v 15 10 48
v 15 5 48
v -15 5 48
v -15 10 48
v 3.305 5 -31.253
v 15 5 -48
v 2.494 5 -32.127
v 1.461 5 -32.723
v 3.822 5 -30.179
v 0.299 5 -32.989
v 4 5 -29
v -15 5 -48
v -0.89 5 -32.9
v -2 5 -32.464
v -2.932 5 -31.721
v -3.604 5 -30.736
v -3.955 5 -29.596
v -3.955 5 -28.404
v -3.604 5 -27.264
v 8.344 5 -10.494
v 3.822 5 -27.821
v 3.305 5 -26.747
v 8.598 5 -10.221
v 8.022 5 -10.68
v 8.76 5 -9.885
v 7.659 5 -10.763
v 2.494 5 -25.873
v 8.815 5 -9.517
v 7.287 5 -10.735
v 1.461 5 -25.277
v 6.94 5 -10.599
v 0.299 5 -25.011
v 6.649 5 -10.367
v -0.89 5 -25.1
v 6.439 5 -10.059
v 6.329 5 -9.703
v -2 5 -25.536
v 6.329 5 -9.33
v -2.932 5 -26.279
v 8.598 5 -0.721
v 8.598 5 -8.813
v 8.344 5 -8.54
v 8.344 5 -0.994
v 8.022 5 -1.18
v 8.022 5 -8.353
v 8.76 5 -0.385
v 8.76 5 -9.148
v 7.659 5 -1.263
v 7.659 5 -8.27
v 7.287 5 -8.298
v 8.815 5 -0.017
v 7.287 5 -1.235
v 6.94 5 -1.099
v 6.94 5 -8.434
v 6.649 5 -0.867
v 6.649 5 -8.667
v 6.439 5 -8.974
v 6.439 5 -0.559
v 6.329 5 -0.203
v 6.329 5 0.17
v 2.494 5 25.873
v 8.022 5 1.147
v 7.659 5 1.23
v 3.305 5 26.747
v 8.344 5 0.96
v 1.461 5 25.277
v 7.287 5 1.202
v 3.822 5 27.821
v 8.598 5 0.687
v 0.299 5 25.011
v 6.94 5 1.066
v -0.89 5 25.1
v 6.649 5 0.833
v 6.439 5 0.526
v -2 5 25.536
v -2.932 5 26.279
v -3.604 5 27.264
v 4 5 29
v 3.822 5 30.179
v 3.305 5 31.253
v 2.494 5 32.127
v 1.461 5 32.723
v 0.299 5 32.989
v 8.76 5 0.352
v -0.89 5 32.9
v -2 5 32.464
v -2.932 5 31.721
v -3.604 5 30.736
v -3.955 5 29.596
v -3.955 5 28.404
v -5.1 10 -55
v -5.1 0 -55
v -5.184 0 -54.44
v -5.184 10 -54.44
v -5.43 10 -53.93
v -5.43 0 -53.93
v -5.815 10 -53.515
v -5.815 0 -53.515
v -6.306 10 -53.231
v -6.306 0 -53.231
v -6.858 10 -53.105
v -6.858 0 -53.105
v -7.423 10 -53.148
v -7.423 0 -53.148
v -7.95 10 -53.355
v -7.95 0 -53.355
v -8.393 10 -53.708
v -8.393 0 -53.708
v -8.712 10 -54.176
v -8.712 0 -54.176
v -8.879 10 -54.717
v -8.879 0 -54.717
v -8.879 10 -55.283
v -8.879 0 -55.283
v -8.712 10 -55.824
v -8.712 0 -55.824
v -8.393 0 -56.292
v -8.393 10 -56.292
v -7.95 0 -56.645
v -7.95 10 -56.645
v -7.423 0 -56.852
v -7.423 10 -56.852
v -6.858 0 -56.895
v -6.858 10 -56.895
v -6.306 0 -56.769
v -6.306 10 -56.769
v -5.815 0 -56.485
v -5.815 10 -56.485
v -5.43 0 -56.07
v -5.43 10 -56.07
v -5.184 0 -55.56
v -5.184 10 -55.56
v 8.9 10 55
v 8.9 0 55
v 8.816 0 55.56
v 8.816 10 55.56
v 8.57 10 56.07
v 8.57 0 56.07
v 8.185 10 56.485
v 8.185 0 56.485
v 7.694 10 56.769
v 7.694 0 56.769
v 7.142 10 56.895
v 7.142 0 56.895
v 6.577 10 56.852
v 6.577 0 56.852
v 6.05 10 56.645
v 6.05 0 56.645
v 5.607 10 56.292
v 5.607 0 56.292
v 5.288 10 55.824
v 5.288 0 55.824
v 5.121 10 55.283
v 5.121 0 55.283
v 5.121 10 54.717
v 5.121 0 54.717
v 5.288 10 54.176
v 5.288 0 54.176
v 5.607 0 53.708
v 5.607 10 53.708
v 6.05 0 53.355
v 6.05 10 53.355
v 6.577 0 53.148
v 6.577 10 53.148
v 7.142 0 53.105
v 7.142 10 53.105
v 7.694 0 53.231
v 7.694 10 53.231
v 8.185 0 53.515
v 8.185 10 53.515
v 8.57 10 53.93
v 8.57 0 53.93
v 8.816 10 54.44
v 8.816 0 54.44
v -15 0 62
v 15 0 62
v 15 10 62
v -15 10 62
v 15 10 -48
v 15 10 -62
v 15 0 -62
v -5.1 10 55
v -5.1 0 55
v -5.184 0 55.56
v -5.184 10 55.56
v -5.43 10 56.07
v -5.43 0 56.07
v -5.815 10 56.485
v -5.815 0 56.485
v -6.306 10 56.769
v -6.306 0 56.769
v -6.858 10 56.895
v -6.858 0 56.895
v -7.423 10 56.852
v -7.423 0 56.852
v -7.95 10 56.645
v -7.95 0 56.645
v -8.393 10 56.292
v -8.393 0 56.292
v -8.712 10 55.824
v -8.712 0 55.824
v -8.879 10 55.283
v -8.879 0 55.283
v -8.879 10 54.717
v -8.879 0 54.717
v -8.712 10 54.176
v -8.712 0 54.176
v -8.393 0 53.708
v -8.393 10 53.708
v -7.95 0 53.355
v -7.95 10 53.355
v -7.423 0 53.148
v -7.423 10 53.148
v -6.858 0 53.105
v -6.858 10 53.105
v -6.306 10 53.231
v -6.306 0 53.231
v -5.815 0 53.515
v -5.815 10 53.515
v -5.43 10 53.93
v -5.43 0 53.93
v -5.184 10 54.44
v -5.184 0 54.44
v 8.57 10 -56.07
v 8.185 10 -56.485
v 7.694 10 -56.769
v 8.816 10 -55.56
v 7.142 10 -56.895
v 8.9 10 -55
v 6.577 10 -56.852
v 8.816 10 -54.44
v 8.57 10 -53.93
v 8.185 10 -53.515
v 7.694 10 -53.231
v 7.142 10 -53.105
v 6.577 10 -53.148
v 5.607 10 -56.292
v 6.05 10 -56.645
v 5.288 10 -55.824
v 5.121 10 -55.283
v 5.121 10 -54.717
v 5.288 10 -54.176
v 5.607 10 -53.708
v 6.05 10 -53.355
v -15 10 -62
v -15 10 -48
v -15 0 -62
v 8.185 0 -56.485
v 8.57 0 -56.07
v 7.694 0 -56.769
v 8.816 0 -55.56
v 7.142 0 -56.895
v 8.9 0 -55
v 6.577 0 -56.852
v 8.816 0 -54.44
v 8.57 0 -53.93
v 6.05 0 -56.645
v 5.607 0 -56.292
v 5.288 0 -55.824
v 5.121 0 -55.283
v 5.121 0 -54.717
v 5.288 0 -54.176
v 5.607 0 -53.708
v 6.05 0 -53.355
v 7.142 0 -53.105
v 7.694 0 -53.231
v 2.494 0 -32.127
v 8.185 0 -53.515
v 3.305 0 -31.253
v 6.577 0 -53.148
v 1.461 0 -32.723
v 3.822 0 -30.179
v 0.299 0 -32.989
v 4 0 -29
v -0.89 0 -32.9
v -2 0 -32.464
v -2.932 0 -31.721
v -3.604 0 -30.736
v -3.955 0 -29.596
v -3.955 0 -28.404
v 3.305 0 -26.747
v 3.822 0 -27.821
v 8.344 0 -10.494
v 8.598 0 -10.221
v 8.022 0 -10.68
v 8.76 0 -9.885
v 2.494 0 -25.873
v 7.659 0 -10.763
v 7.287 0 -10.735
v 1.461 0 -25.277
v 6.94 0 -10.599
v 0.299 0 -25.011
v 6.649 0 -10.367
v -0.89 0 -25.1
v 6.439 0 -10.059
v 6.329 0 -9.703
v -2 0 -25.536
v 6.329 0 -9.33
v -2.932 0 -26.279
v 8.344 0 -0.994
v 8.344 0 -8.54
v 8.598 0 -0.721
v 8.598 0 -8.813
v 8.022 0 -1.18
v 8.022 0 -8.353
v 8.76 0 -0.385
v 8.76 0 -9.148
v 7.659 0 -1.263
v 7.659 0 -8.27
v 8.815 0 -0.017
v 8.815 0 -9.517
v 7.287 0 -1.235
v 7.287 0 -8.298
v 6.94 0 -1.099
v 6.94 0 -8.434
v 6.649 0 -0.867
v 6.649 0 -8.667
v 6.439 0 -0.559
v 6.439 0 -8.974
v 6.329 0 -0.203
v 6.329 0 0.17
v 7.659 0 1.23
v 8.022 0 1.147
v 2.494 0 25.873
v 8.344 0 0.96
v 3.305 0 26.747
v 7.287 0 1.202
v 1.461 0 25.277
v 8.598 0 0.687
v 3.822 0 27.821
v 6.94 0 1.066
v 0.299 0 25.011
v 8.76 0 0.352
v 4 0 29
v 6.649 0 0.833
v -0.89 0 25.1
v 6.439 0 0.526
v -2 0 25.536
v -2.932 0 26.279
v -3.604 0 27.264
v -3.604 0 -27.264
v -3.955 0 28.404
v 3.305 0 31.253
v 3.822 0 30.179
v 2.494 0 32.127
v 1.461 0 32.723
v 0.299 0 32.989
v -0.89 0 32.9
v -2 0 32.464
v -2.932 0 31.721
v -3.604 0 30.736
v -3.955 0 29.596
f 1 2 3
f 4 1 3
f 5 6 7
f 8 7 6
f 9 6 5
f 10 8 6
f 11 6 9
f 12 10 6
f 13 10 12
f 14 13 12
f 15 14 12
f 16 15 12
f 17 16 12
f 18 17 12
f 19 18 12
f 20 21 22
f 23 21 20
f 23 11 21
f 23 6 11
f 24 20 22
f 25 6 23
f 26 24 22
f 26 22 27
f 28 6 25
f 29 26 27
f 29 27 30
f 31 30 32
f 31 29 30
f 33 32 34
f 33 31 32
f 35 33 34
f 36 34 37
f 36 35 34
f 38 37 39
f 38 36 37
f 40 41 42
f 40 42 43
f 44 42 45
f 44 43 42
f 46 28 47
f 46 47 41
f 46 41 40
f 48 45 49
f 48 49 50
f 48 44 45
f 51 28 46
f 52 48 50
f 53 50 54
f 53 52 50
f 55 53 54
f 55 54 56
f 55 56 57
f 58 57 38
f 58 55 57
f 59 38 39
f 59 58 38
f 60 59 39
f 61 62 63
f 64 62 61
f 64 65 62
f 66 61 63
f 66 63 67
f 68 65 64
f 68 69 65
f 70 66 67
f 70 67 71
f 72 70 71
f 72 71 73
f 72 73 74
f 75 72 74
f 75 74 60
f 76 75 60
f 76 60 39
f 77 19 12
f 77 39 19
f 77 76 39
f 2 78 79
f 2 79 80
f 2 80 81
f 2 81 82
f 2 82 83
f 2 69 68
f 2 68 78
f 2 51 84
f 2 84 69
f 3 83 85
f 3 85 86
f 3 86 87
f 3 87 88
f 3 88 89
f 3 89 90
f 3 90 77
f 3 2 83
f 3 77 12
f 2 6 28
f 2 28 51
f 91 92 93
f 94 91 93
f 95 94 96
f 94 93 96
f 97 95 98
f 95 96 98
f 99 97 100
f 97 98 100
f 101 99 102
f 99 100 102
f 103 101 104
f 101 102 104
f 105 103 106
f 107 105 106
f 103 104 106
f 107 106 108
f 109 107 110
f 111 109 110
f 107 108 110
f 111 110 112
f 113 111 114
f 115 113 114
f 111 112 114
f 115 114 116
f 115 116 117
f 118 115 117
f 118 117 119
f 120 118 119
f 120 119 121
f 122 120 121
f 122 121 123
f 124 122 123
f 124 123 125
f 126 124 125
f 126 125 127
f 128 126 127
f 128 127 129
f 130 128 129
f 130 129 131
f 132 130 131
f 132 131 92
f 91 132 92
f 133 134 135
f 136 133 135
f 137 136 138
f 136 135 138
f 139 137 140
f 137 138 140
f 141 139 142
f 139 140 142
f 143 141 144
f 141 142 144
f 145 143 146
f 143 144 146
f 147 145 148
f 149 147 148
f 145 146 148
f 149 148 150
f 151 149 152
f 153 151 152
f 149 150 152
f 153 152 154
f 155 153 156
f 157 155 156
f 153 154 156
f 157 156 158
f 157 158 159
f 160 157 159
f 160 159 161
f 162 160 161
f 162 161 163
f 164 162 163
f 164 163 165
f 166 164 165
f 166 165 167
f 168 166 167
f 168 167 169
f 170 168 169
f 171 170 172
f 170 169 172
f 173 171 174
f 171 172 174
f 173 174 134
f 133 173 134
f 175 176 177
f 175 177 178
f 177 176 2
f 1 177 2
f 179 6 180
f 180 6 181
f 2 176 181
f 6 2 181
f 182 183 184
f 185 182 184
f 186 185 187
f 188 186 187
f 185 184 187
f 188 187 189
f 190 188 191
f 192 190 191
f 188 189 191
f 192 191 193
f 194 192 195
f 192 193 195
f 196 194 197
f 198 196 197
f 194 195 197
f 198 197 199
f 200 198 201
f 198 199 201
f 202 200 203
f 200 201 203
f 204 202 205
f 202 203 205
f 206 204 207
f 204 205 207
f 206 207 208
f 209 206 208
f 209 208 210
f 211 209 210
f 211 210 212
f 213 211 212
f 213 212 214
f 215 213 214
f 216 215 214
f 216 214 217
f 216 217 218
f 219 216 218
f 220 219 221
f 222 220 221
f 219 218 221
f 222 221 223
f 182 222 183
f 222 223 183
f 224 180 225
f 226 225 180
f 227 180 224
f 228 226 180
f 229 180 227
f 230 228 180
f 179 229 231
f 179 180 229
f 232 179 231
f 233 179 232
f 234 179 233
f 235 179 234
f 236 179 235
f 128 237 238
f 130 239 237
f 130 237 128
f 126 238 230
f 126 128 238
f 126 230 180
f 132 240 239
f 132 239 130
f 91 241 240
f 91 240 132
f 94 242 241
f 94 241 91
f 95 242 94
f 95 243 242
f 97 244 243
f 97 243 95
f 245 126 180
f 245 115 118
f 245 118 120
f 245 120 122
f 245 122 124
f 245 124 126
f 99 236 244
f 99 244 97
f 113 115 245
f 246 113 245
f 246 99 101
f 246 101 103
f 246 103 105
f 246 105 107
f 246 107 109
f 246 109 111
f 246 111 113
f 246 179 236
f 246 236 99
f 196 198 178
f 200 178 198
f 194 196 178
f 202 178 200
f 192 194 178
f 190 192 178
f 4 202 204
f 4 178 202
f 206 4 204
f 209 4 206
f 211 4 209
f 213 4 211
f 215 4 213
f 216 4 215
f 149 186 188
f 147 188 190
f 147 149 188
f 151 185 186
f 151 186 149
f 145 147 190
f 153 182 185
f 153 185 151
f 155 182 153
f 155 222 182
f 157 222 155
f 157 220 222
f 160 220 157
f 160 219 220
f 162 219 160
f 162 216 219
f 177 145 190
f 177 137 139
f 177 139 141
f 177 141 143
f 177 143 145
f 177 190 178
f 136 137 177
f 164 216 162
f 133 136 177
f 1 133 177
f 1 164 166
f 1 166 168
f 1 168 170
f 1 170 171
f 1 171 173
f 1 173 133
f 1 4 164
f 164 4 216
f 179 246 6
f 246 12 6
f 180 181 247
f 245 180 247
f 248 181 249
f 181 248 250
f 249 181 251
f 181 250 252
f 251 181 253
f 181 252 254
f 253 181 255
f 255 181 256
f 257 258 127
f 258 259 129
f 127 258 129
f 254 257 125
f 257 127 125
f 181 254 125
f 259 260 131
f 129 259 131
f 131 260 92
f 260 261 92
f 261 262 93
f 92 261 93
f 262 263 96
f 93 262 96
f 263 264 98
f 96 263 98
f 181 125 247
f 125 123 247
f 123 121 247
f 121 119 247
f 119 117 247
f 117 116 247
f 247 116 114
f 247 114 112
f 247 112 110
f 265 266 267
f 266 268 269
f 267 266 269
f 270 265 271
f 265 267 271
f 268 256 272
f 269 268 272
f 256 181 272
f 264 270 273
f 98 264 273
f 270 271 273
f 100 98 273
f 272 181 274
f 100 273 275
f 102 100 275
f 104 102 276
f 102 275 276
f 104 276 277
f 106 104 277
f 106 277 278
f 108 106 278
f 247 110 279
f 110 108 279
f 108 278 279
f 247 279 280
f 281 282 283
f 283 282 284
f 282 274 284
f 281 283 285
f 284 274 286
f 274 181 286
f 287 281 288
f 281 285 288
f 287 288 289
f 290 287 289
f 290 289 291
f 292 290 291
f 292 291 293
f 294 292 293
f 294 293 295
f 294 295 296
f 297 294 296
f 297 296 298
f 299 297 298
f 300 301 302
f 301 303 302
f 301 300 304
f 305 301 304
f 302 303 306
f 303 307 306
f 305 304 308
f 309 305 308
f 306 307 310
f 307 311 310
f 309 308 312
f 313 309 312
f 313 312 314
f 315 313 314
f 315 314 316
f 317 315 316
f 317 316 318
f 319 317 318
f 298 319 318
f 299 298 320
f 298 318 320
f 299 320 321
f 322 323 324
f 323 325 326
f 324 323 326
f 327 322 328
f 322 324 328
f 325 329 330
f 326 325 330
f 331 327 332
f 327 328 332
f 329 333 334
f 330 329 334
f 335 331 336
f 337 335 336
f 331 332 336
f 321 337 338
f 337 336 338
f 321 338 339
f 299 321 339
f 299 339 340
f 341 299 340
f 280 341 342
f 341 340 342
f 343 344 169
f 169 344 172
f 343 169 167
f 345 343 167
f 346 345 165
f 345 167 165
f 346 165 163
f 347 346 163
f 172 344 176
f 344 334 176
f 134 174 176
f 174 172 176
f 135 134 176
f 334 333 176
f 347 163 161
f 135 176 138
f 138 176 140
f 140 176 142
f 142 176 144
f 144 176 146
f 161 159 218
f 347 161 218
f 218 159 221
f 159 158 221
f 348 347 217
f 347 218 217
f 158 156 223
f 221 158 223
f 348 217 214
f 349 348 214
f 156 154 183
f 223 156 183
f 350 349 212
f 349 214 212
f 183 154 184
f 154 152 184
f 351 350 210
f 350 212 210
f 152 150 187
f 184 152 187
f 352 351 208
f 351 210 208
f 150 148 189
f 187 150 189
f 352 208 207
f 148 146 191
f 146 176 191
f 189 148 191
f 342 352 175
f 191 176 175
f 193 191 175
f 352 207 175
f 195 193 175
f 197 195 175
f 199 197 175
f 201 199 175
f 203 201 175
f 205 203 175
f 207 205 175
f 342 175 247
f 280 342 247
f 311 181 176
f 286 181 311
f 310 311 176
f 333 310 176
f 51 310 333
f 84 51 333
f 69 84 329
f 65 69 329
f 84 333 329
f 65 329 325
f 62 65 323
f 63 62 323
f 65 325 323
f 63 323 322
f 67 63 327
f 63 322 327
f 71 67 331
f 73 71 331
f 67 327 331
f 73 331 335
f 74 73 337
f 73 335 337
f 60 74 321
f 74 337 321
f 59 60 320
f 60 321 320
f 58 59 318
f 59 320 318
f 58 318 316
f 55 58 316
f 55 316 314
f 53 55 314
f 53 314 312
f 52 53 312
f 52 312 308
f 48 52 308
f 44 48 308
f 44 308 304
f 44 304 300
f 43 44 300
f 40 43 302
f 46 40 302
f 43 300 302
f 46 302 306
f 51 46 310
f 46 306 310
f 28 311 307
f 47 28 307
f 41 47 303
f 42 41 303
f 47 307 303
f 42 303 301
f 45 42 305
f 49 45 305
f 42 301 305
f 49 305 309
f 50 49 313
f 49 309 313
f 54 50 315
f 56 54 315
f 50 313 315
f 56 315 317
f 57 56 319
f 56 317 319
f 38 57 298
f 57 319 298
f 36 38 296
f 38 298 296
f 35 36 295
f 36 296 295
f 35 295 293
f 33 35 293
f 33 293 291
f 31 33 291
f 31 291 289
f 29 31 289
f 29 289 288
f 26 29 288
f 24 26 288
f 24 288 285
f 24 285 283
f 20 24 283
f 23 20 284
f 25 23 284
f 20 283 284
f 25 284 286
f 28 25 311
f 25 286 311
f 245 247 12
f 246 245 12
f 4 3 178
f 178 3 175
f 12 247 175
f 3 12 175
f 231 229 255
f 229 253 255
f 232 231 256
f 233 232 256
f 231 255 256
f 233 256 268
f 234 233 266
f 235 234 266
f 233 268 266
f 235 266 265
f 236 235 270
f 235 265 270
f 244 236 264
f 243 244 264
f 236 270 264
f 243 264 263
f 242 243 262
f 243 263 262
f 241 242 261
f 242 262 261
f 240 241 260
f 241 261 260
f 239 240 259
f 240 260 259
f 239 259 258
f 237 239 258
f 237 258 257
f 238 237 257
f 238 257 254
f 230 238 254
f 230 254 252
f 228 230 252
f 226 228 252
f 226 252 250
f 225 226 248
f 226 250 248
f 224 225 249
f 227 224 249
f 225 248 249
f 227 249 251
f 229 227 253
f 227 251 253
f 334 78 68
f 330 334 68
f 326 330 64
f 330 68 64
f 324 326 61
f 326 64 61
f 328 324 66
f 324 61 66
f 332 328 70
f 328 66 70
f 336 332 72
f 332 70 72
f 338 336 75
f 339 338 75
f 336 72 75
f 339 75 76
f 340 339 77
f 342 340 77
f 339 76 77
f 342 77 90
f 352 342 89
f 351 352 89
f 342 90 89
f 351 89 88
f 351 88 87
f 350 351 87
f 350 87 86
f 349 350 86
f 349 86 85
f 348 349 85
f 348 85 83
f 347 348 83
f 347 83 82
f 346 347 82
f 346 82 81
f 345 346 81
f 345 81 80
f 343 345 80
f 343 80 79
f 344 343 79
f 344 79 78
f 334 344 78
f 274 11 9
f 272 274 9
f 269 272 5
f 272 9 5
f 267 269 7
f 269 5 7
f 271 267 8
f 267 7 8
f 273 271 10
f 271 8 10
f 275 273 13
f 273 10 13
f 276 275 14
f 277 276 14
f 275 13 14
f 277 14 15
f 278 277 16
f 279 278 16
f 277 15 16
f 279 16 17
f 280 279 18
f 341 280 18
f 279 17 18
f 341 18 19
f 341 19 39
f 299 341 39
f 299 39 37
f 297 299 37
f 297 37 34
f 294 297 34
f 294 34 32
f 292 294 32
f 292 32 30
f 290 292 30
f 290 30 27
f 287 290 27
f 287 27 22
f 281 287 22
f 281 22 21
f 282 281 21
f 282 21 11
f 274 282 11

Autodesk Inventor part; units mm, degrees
ref_plane "YZ Plane" through (0, 0, 0) normal (1, 0, 0) x (0, 1, 0)
ref_plane "XZ Plane" through (0, 0, 0) normal (0, 1, 0) x (-1, 0, 0)
ref_plane "XY Plane" through (0, 0, 0) normal (0, 0, 1) x (1, 0, 0)
sketch "Эскиз1" plane through (0, 0, 0) normal (0, 1, 0) x (-1, 0, 0)
  line L0 (-15, 62) -> (15, 62)
  line L1 (15, 62) -> (15, -62)
  line L2 (15, -62) -> (-15, -62)
  line L3 (-15, -62) -> (-15, 62)
  line L4 (-15, 62) -> (15, -62) construction
  line L5 (15, 62) -> (-15, -62) construction
  point P0 (0, 0)
  dimension "d0" = 30
  dimension "d1" = 124
extrude "Выдавливание1" add sketch "Эскиз1" along normal blind 5
sketch "Эскиз2" plane through (0, 5, 0) normal (0, 1, 0) x (1, 0, 0)
  line L0 (-15, -62) -> (15, -62) projected
  line L1 (15, -62) -> (15, 62) projected
  line L2 (-15, -62) -> (15, -62)
  line L3 (15, -62) -> (15, -48)
  line L4 (15, -48) -> (-15, -48)
  line L5 (-15, -48) -> (-15, -62)
  point P0 (0, 0)
  dimension "d4" = 14
extrude "Выдавливание2" add sketch "Эскиз2" along normal blind 5
mirror "Зеркальное отражение1" about plane through (0, 0, 0) normal (0, 0, 1) of "Выдавливание2"
sketch "Эскиз3" plane through (0, 5, 0) normal (0, 1, 0) x (1, 0, 0)
  line L0 (15, 48) -> (-15, 48) projected
  line L1 (0, 48) -> (0, 29)
  circle A0 centre (0, 29) radius 4
  point P0 (0, 0)
  dimension "d7" = 19
  dimension "d8" = 8
extrude "Выдавливание3" cut sketch "Эскиз3" against normal blind 15
mirror "Зеркальное отражение2" about plane through (0, 0, 0) normal (0, 0, 1) of "Выдавливание3"
sketch "Эскиз4" plane through (0, 0, 0) normal (0, -1, 0) x (1, 0, 0)
  line L0 (15, -62) -> (15, 62) projected
  line L1 (15, 48) -> (-15, 48) projected
  line L2 (15, 62) -> (-15, 62)
  line L3 (-15, 62) -> (-15, 48)
  line L4 (-15, 48) -> (15, 48)
  line L5 (15, 48) -> (15, 62)
  line L6 (15, 62) -> (-15, 62) projected
  line L7 (0, 62) -> (0, 55)
  line L8 (0, 55) -> (7, 55)
  circle A0 centre (7, 55) radius 1.9
  circle A1 centre (-7, 55) radius 1.9
  point P0 (0, 0)
  dimension "d11" = 7
  dimension "d12" = 7
  dimension "d13" = 3.8
extrude "Выдавливание4" cut sketch "Эскиз4" against normal through all contours A0 | A1
mirror "Зеркальное отражение3" about plane through (0, 0, 0) normal (0, 0, 1) of "Выдавливание4"
sketch "Эскиз5" plane through (0, 0, 0) normal (0, -1, 0) x (1, 0, 0)
  line L0 (15.3651, -14.5668) -> (15.3651, -14.0542)
  line L1 (15.3651, -14.0542) -> (13.9311, -13.9625)
  arc A0 (13.9311, -9.7711) -> (13.9311, -13.9625) centre (14.0651, -11.8668) ccw
  line L2 (13.9311, -9.7711) -> (15.3651, -9.6794)
  line L3 (15.3651, -9.6794) -> (15.3651, -5.3911)
  arc A1 (15.3651, -5.3911) -> (15.3358, -5.3204) centre (15.2651, -5.3911) ccw
  line L4 (15.3358, -5.3204) -> (15.0115, -4.9961)
  arc A2 (14.8651, -4.6426) -> (15.0115, -4.9961) centre (15.3651, -4.6426) ccw
  line L5 (14.8651, -4.6426) -> (14.8651, 5.0332)
  arc A3 (14.8651, 5.0332) -> (14.7651, 5.1332) centre (14.7651, 5.0332) ccw
  line L6 (14.7651, 5.1332) -> (5.6151, 5.1332)
  arc A4 (5.6151, 5.1332) -> (5.5151, 5.0332) centre (5.6151, 5.0332) ccw
  line L7 (5.5151, 5.0332) -> (5.5151, 2.1074)
  arc A5 (5.3686, 1.7539) -> (5.5151, 2.1074) centre (5.0151, 2.1074) ccw
  line L8 (5.3686, 1.7539) -> (5.0444, 1.4296)
  arc A6 (5.0444, 1.4296) -> (5.0151, 1.3589) centre (5.1151, 1.3589) ccw
  line L9 (5.0151, 1.3589) -> (5.0151, -1.3926)
  arc A7 (5.0151, -1.3926) -> (5.0444, -1.4633) centre (5.1151, -1.3926) ccw
  line L10 (5.0444, -1.4633) -> (5.3686, -1.7875)
  arc A8 (5.5151, -2.1411) -> (5.3686, -1.7875) centre (5.0151, -2.1411) ccw
  line L11 (5.5151, -2.1411) -> (5.5151, -7.3926)
  arc A9 (5.3686, -7.7461) -> (5.5151, -7.3926) centre (5.0151, -7.3926) ccw
  line L12 (5.3686, -7.7461) -> (5.0444, -8.0704)
  arc A10 (5.0444, -8.0704) -> (5.0151, -8.1411) centre (5.1151, -8.1411) ccw
  line L13 (5.0151, -8.1411) -> (5.0151, -10.8926)
  arc A11 (5.0151, -10.8926) -> (5.0444, -10.9633) centre (5.1151, -10.8926) ccw
  line L14 (5.0444, -10.9633) -> (5.3686, -11.2875)
  arc A12 (5.5151, -11.6411) -> (5.3686, -11.2875) centre (5.0151, -11.6411) ccw
  line L15 (5.5151, -11.6411) -> (5.5151, -14.5668)
  arc A13 (5.5151, -14.5668) -> (5.6151, -14.6668) centre (5.6151, -14.5668) ccw
  line L16 (5.6151, -14.6668) -> (15.2651, -14.6668)
  arc A14 (15.2651, -14.6668) -> (15.3651, -14.5668) centre (15.2651, -14.5668) ccw
  circle A15 centre (7.5651, -9.5168) radius 1.25
  circle A16 centre (7.5651, -0.0168) radius 1.25
  line L17 (9.8151, 1.1565) -> (11.1151, 0.5398)
  line L18 (11.1151, 0.5398) -> (11.1151, 0.5232)
  line L19 (11.1151, 0.5232) -> (9.8151, -0.0768)
  line L20 (9.8151, -0.0768) -> (9.8151, 0.05)
  line L21 (9.8151, 0.05) -> (10.2318, 0.2422)
  line L22 (10.2318, 0.2422) -> (10.2318, 0.8315)
  line L23 (10.2318, 0.8315) -> (9.8151, 1.0292)
  line L24 (9.8151, 1.0292) -> (9.8151, 1.1565)
  spline S0 degree 3 poles (10.7516, -1.6635) (10.7604, -1.6633) (10.7779, -1.6628) (10.8035, -1.6587) (10.8283, -1.6525) (10.8522, -1.6436) (10.875, -1.6318) (10.8968, -1.6176) (10.9178, -1.6011) (10.9376, -1.582) (10.9556, -1.561) (10.9717, -1.5389) (10.985, -1.5155) (10.996, -1.4909) (11.0046, -1.4652) (11.0106, -1.4383) (11.0143, -1.4103) (11.0148, -1.3912) (11.0151, -1.3815) knots 0 0 0 0 0.061965 0.122122 0.180988 0.239933 0.299906 0.359989 0.421776 0.486576 0.551535 0.615018 0.677259 0.73973 0.80305 0.866495 0.931973 1 1 1 1
  spline S1 degree 3 poles (11.0151, -1.3815) (11.0148, -1.3713) (11.0143, -1.3513) (11.0107, -1.322) (11.0044, -1.2941) (10.9958, -1.2674) (10.9848, -1.2419) (10.9712, -1.2178) (10.9549, -1.1951) (10.9365, -1.1738) (10.916, -1.1542) (10.8931, -1.137) (10.8683, -1.1219) (10.8416, -1.1087) (10.8128, -1.098) (10.7819, -1.0899) (10.7492, -1.0834) (10.7267, -1.0813) (10.7151, -1.0802) knots 0 0 0 0 0.064439 0.126547 0.186887 0.245878 0.304041 0.362191 0.420976 0.48066 0.5406 0.600689 0.661936 0.724443 0.789038 0.856314 0.926352 1 1 1 1
  line L25 (10.7151, -1.0802) -> (10.7151, -0.9635)
  spline S2 degree 3 poles (10.7151, -0.9635) (10.7306, -0.9643) (10.761, -0.9657) (10.8053, -0.9727) (10.8477, -0.9827) (10.8877, -0.9969) (10.9258, -1.0145) (10.9619, -1.0355) (10.9957, -1.0605) (11.0269, -1.0888) (11.0556, -1.1195) (11.0803, -1.1527) (11.1013, -1.1876) (11.1188, -1.224) (11.1319, -1.2624) (11.1416, -1.3025) (11.1475, -1.3444) (11.1481, -1.3729) (11.1484, -1.3875) knots 0 0 0 0 0.068791 0.135103 0.198979 0.261904 0.323495 0.385195 0.446969 0.509765 0.572251 0.633405 0.693251 0.752583 0.812579 0.873275 0.93555 1 1 1 1
  spline S3 degree 3 poles (11.1484, -1.3875) (11.1481, -1.4017) (11.1474, -1.4297) (11.1418, -1.4706) (11.133, -1.5095) (11.1206, -1.5464) (11.104, -1.5809) (11.084, -1.6134) (11.0609, -1.6442) (11.0337, -1.6719) (11.0046, -1.6974) (10.9736, -1.7193) (10.9416, -1.7381) (10.9083, -1.7538) (10.8734, -1.7653) (10.8375, -1.7741) (10.8001, -1.779) (10.7748, -1.7798) (10.762, -1.7802) knots 0 0 0 0 0.069475 0.136517 0.200789 0.26383 0.325735 0.387291 0.449509 0.512968 0.576275 0.63758 0.697903 0.757172 0.816599 0.876653 0.93729 1 1 1 1
  spline S4 degree 3 poles (10.762, -1.7802) (10.7439, -1.7795) (10.708, -1.7783) (10.6552, -1.7676) (10.6041, -1.751) (10.563, -1.7309) (10.5298, -1.7107) (10.5026, -1.6924) (10.4732, -1.6711) (10.4418, -1.6463) (10.4082, -1.6187) (10.3723, -1.5878) (10.3346, -1.5536) (10.3089, -1.5296) (10.2956, -1.5171) knots 0 0 0 0 0.098702 0.195672 0.292422 0.391343 0.444462 0.504229 0.570352 0.642546 0.722288 0.807921 0.90047 1 1 1 1
  line L26 (10.2956, -1.5171) -> (9.9484, -1.1919)
  line L27 (9.9484, -1.1919) -> (9.9484, -1.7968)
  line L28 (9.9484, -1.7968) -> (9.8151, -1.7968)
  line L29 (9.8151, -1.7968) -> (9.8151, -0.9135)
  line L30 (9.8151, -0.9135) -> (10.3531, -1.4177)
  spline S5 degree 3 poles (10.3531, -1.4177) (10.3659, -1.4299) (10.3905, -1.4535) (10.4265, -1.4869) (10.4598, -1.5168) (10.4905, -1.5436) (10.5189, -1.5665) (10.5443, -1.5869) (10.5676, -1.6032) (10.5946, -1.621) (10.6276, -1.6381) (10.6679, -1.6529) (10.7094, -1.6619) (10.7374, -1.663) (10.7516, -1.6635) knots 0 0 0 0 0.110803 0.212829 0.306101 0.390647 0.466924 0.534481 0.593587 0.644557 0.7362 0.825024 0.911986 1 1 1 1
  line L31 (10.4651, -2.1735) -> (11.1151, -2.3068)
  line L32 (11.1151, -2.3068) -> (11.1151, -2.8402)
  line L33 (11.1151, -2.8402) -> (10.9818, -2.8402)
  line L34 (10.9818, -2.8402) -> (10.9818, -2.398)
  line L35 (10.9818, -2.398) -> (10.6398, -2.3279)
  spline S6 degree 3 poles (10.6398, -2.3279) (10.6436, -2.3417) (10.651, -2.3684) (10.6592, -2.4077) (10.6641, -2.4451) (10.6648, -2.4693) (10.6651, -2.481) knots 0 0 0 0 0.275068 0.532901 0.773973 1 1 1 1
  spline S7 degree 3 poles (10.6651, -2.481) (10.6648, -2.4956) (10.6642, -2.5241) (10.6582, -2.5659) (10.6489, -2.6057) (10.6358, -2.6436) (10.6192, -2.6796) (10.5983, -2.7133) (10.574, -2.7453) (10.546, -2.775) (10.5152, -2.802) (10.4821, -2.8257) (10.447, -2.8458) (10.4095, -2.862) (10.3702, -2.8749) (10.3285, -2.8835) (10.2849, -2.8892) (10.255, -2.8898) (10.2398, -2.8902) knots 0 0 0 0 0.065808 0.129394 0.190894 0.251281 0.310815 0.370371 0.430768 0.492881 0.555104 0.616067 0.677256 0.73826 0.800762 0.864778 0.931045 1 1 1 1
  spline S8 degree 3 poles (10.2398, -2.8902) (10.2292, -2.8899) (10.2082, -2.8894) (10.1769, -2.8869) (10.1464, -2.8821) (10.1164, -2.8757) (10.0872, -2.8673) (10.0586, -2.8572) (10.0308, -2.8448) (10.0036, -2.8312) (9.9775, -2.8158) (9.9531, -2.7988) (9.9301, -2.7809) (9.9086, -2.7615) (9.8888, -2.7407) (9.8706, -2.7185) (9.8537, -2.6952) (9.8388, -2.6705) (9.8251, -2.6448) (9.8138, -2.6178) (9.8038, -2.5901) (9.7957, -2.5614) (9.7894, -2.5317) (9.7852, -2.5008) (9.7821, -2.4691) (9.7819, -2.4476) (9.7818, -2.4368) knots 0 0 0 0 0.044014 0.087434 0.130118 0.172554 0.214555 0.256298 0.298438 0.340849 0.382715 0.423924 0.464246 0.504074 0.543862 0.583567 0.623094 0.663229 0.703551 0.743938 0.784541 0.82575 0.867757 0.910745 0.954914 1 1 1 1
  spline S9 degree 3 poles (9.7818, -2.4368) (9.782, -2.4238) (9.7825, -2.3983) (9.7878, -2.361) (9.7954, -2.3251) (9.8067, -2.2909) (9.821, -2.258) (9.839, -2.2271) (9.8594, -2.1971) (9.8835, -2.1694) (9.9099, -2.1437) (9.9385, -2.1208) (9.9688, -2.1003) (10.0011, -2.0826) (10.0352, -2.0676) (10.0713, -2.0558) (10.1091, -2.0462) (10.1352, -2.0422) (10.1484, -2.0402) knots 0 0 0 0 0.065421 0.128708 0.190236 0.250724 0.310637 0.370766 0.431615 0.493523 0.555883 0.617342 0.678668 0.740711 0.802985 0.866803 0.932347 1 1 1 1
  line L36 (10.1484, -2.0402) -> (10.1484, -2.1568)
  spline S10 degree 3 poles (10.1484, -2.1568) (10.136, -2.1597) (10.1122, -2.1652) (10.0787, -2.1773) (10.0489, -2.1921) (10.0223, -2.2097) (9.9991, -2.2307) (9.9785, -2.2547) (9.9598, -2.2816) (9.9443, -2.3114) (9.9311, -2.3429) (9.9222, -2.3759) (9.916, -2.4095) (9.9154, -2.4321) (9.9151, -2.4435) knots 0 0 0 0 0.094687 0.181994 0.264377 0.34218 0.418618 0.496509 0.577369 0.661511 0.746733 0.831258 0.915206 1 1 1 1
  spline S11 degree 3 poles (9.9151, -2.4435) (9.9154, -2.4547) (9.916, -2.4766) (9.9206, -2.5088) (9.9277, -2.54) (9.9384, -2.5697) (9.9513, -2.5985) (9.9679, -2.6257) (9.9871, -2.652) (10.0089, -2.6767) (10.0331, -2.6993) (10.0589, -2.7192) (10.0864, -2.7359) (10.1152, -2.7499) (10.1455, -2.7605) (10.1773, -2.7681) (10.2105, -2.7726) (10.2332, -2.7732) (10.2448, -2.7735) knots 0 0 0 0 0.064207 0.126425 0.18768 0.248216 0.308305 0.369661 0.431699 0.495947 0.559758 0.622295 0.683911 0.745092 0.80674 0.869087 0.93329 1 1 1 1
  spline S12 degree 3 poles (10.2448, -2.7735) (10.2552, -2.7733) (10.2756, -2.7728) (10.3055, -2.7689) (10.3337, -2.7621) (10.3605, -2.7526) (10.3859, -2.7406) (10.4098, -2.726) (10.432, -2.7084) (10.4524, -2.6883) (10.4713, -2.6663) (10.4874, -2.642) (10.501, -2.6159) (10.5127, -2.5883) (10.521, -2.5586) (10.5274, -2.5274) (10.531, -2.4942) (10.5315, -2.4716) (10.5318, -2.46) knots 0 0 0 0 0.065351 0.127916 0.18836 0.247216 0.30563 0.36377 0.422661 0.482687 0.5433 0.604118 0.664965 0.727413 0.791468 0.858055 0.927037 1 1 1 1
  spline S13 degree 3 poles (10.5318, -2.46) (10.5315, -2.4499) (10.5311, -2.4291) (10.5278, -2.3972) (10.5225, -2.3636) (10.5153, -2.3286) (10.5057, -2.292) (10.4943, -2.2538) (10.4807, -2.2141) (10.4704, -2.1873) (10.4651, -2.1735) knots 0 0 0 0 0.102203 0.211023 0.3251 0.446502 0.573788 0.708901 0.850358 1 1 1 1
  line L37 (9.8151, -5.6202) -> (11.1151, -6.2368)
  line L38 (11.1151, -6.2368) -> (11.1151, -6.2535)
  line L39 (11.1151, -6.2535) -> (9.8151, -6.8535)
  line L40 (9.8151, -6.8535) -> (9.8151, -6.7267)
  line L41 (9.8151, -6.7267) -> (10.2318, -6.5345)
  line L42 (10.2318, -6.5345) -> (10.2318, -5.9452)
  line L43 (10.2318, -5.9452) -> (9.8151, -5.7475)
  line L44 (9.8151, -5.7475) -> (9.8151, -5.6202)
  spline S14 degree 3 poles (10.4726, -7.1302) (10.496, -7.1307) (10.542, -7.1319) (10.6096, -7.1415) (10.6742, -7.1571) (10.736, -7.1791) (10.7951, -7.2071) (10.8511, -7.2416) (10.9044, -7.2824) (10.9542, -7.329) (10.9997, -7.3801) (11.0397, -7.4348) (11.0731, -7.493) (11.1009, -7.5541) (11.1223, -7.6186) (11.1373, -7.6862) (11.1467, -7.7569) (11.1478, -7.8051) (11.1484, -7.8296) knots 0 0 0 0 0.064558 0.127014 0.187955 0.248014 0.307748 0.368235 0.42947 0.492743 0.556258 0.618217 0.679655 0.741246 0.803415 0.866815 0.932328 1 1 1 1
  spline S15 degree 3 poles (11.1484, -7.8296) (11.1482, -7.8446) (11.1479, -7.8741) (11.1444, -7.9179) (11.1387, -7.9605) (11.1308, -8.0019) (11.1211, -8.0424) (11.1084, -8.0817) (11.0939, -8.12) (11.0772, -8.1571) (11.0585, -8.1927) (11.0379, -8.2269) (11.0155, -8.2594) (10.9915, -8.2904) (10.9653, -8.3194) (10.9378, -8.3473) (10.908, -8.373) (10.8871, -8.3889) (10.8766, -8.3968) knots 0 0 0 0 0.068548 0.135683 0.201215 0.265682 0.329267 0.392395 0.45507 0.517127 0.57879 0.63974 0.700192 0.759806 0.819628 0.879355 0.939512 1 1 1 1
  line L45 (10.8766, -8.3968) -> (10.7984, -8.2947)
  spline S16 degree 3 poles (10.7984, -8.2947) (10.8071, -8.2875) (10.8243, -8.273) (10.8486, -8.2497) (10.8712, -8.2255) (10.8925, -8.2002) (10.9116, -8.1736) (10.9295, -8.1462) (10.9456, -8.1175) (10.9651, -8.0778) (10.9854, -8.026) (11.0025, -7.9607) (11.0133, -7.8925) (11.0145, -7.846) (11.0151, -7.8223) knots 0 0 0 0 0.063163 0.125475 0.187121 0.248294 0.309295 0.36985 0.430973 0.492456 0.616148 0.740844 0.868183 1 1 1 1
  spline S17 degree 3 poles (11.0151, -7.8223) (11.0149, -7.8093) (11.0146, -7.7834) (11.0107, -7.7449) (11.0052, -7.7071) (10.9969, -7.6701) (10.9866, -7.6338) (10.9741, -7.5981) (10.9588, -7.5635) (10.9418, -7.5295) (10.9226, -7.4969) (10.9017, -7.466) (10.8793, -7.437) (10.8553, -7.4099) (10.8298, -7.3846) (10.8025, -7.3613) (10.7736, -7.34) (10.7434, -7.3204) (10.712, -7.3029) (10.6793, -7.2882) (10.6458, -7.2752) (10.6112, -7.2649) (10.5757, -7.2568) (10.5393, -7.2512) (10.5019, -7.2473) (10.4766, -7.247) (10.4638, -7.2468) knots 0 0 0 0 0.043955 0.087502 0.130463 0.172752 0.215403 0.25765 0.300153 0.343121 0.385925 0.427686 0.468818 0.509492 0.549883 0.58998 0.630405 0.670869 0.711384 0.751627 0.791776 0.832459 0.873319 0.914543 0.956924 1 1 1 1
  spline S18 degree 3 poles (10.4638, -7.2468) (10.4446, -7.2473) (10.4069, -7.2482) (10.3516, -7.2564) (10.2987, -7.2689) (10.2484, -7.2875) (10.2001, -7.3105) (10.1547, -7.3396) (10.1115, -7.3732) (10.0714, -7.412) (10.0348, -7.4544) (10.0026, -7.5) (9.9758, -7.5486) (9.9534, -7.5996) (9.9362, -7.6535) (9.9241, -7.7101) (9.9162, -7.7694) (9.9155, -7.8098) (9.9151, -7.8304) knots 0 0 0 0 0.064323 0.12629 0.186726 0.246146 0.305576 0.365429 0.426326 0.48884 0.551725 0.613919 0.675484 0.737334 0.800229 0.864502 0.931041 1 1 1 1
  spline S19 degree 3 poles (9.9151, -7.8304) (9.9157, -7.8531) (9.917, -7.8978) (9.9274, -7.9633) (9.9444, -8.026) (9.9681, -8.0859) (9.999, -8.1429) (10.0364, -8.197) (10.0807, -8.2482) (10.1145, -8.279) (10.1318, -8.2947) knots 0 0 0 0 0.128515 0.252949 0.374755 0.49594 0.617181 0.740909 0.867811 1 1 1 1
  line L46 (10.1318, -8.2947) -> (10.0544, -8.3968)
  spline S20 degree 3 poles (10.0544, -8.3968) (10.0438, -8.3886) (10.0227, -8.3722) (9.9929, -8.3457) (9.9648, -8.3177) (9.9388, -8.2881) (9.9142, -8.2573) (9.8918, -8.2245) (9.8713, -8.1904) (9.8525, -8.155) (9.8358, -8.1183) (9.8215, -8.0804) (9.8092, -8.0415) (9.7991, -8.0015) (9.7912, -7.9604) (9.7859, -7.9183) (9.7823, -7.8751) (9.7819, -7.846) (9.7818, -7.8312) knots 0 0 0 0 0.061674 0.123053 0.183475 0.243727 0.304279 0.364863 0.425946 0.487391 0.54922 0.611144 0.673529 0.736961 0.800785 0.866013 0.932101 1 1 1 1
  spline S21 degree 3 poles (9.7818, -7.8312) (9.7819, -7.8172) (9.7821, -7.7896) (9.7852, -7.7488) (9.7894, -7.709) (9.7958, -7.6705) (9.8034, -7.6329) (9.8135, -7.5967) (9.8249, -7.5614) (9.8382, -7.5272) (9.8532, -7.4942) (9.8703, -7.4623) (9.8891, -7.4316) (9.9093, -7.4018) (9.9316, -7.3733) (9.9556, -7.346) (9.9813, -7.3196) (9.9998, -7.3032) (10.0091, -7.295) knots 0 0 0 0 0.069663 0.13775 0.203917 0.26878 0.332414 0.394754 0.45618 0.516996 0.577396 0.637198 0.696999 0.756756 0.816554 0.876948 0.938132 1 1 1 1
  spline S22 degree 3 poles (10.0091, -7.295) (10.0253, -7.2818) (10.0574, -7.2557) (10.1095, -7.2222) (10.1639, -7.1935) (10.2209, -7.1704) (10.2804, -7.1523) (10.3423, -7.1397) (10.4066, -7.1316) (10.4504, -7.1306) (10.4726, -7.1302) knots 0 0 0 0 0.124329 0.247156 0.36878 0.490734 0.613614 0.738958 0.867311 1 1 1 1
  line L47 (11.0651, -10.2028) -> (11.0651, -9.99)
  line L48 (9.9651, -9.8025) -> (11.0651, -10.2028)
  line L49 (9.9651, -10.3025) -> (9.9651, -9.8025)
  line L50 (11.0651, -10.7028) -> (9.9651, -10.3025)
  line L51 (11.0651, -10.9157) -> (11.0651, -10.7028)
  line L52 (9.9651, -10.5153) -> (11.0651, -10.9157)
  line L53 (9.9651, -10.7153) -> (9.9651, -10.5153)
  line L54 (9.7651, -10.6425) -> (9.9651, -10.7153)
  line L55 (9.7651, -9.5168) -> (9.7651, -10.6425)
  line L56 (11.0651, -9.99) -> (9.7651, -9.5168)
  line L57 (9.8151, -4.8268) -> (9.8151, -4.8102)
  line L58 (9.8151, -4.8102) -> (11.1151, -4.2602)
  line L59 (11.1151, -4.2602) -> (11.1151, -4.3852)
  line L60 (11.1151, -4.3852) -> (10.0906, -4.8185)
  line L61 (10.0906, -4.8185) -> (11.1151, -5.2518)
  line L62 (11.1151, -5.2518) -> (11.1151, -5.3768)
  line L63 (11.1151, -5.3768) -> (9.8151, -4.8268)
  spline S23 degree 3 poles (10.4646, -4.0168) (10.4447, -4.0166) (10.406, -4.0161) (10.3493, -4.0137) (10.2958, -4.0089) (10.2454, -4.0028) (10.1982, -3.9945) (10.1541, -3.9842) (10.1129, -3.9729) (10.0749, -3.9588) (10.0396, -3.9434) (10.0067, -3.9267) (9.9758, -3.9088) (9.9472, -3.8892) (9.9207, -3.8684) (9.8967, -3.8459) (9.8748, -3.8222) (9.8552, -3.7972) (9.8381, -3.771) (9.8228, -3.7443) (9.8104, -3.7165) (9.7998, -3.6883) (9.7917, -3.6593) (9.7861, -3.6295) (9.7822, -3.5991) (9.7819, -3.5785) (9.7818, -3.5681) knots 0 0 0 0 0.065063 0.126773 0.185516 0.240765 0.29298 0.34225 0.388919 0.432776 0.474628 0.514775 0.553606 0.591426 0.628028 0.663804 0.698984 0.733591 0.767628 0.801208 0.834264 0.866981 0.89972 0.932702 0.966176 1 1 1 1
  spline S24 degree 3 poles (9.7818, -3.5681) (9.7819, -3.5579) (9.7823, -3.5377) (9.7858, -3.5077) (9.7915, -3.4786) (9.7994, -3.4503) (9.8092, -3.4225) (9.8219, -3.3958) (9.8365, -3.3697) (9.8531, -3.3443) (9.8722, -3.3201) (9.8933, -3.2971) (9.9169, -3.2757) (9.9427, -3.2558) (9.9704, -3.2368) (10.0005, -3.2194) (10.0328, -3.2033) (10.0674, -3.1886) (10.105, -3.1755) (10.1459, -3.164) (10.1905, -3.1549) (10.2385, -3.1471) (10.29, -3.1408) (10.3451, -3.1365) (10.4037, -3.1339) (10.4439, -3.1336) (10.4646, -3.1335) knots 0 0 0 0 0.033787 0.066622 0.099285 0.131361 0.163585 0.196104 0.228902 0.262158 0.295991 0.330218 0.36506 0.400951 0.43762 0.475708 0.515381 0.556414 0.599765 0.646424 0.696431 0.749782 0.806573 0.867436 0.931887 1 1 1 1
  spline S25 degree 3 poles (10.4646, -3.1335) (10.4854, -3.1336) (10.5259, -3.1339) (10.5849, -3.1365) (10.6402, -3.1409) (10.6919, -3.1469) (10.7399, -3.1541) (10.7842, -3.1639) (10.8249, -3.175) (10.8622, -3.1878) (10.8966, -3.2023) (10.9287, -3.218) (10.9585, -3.2357) (10.9864, -3.2543) (11.012, -3.2745) (11.0356, -3.2958) (11.0568, -3.3189) (11.076, -3.3432) (11.0929, -3.3689) (11.1078, -3.3951) (11.1205, -3.4221) (11.1305, -3.45) (11.1387, -3.4785) (11.1444, -3.5077) (11.1479, -3.5377) (11.1483, -3.5579) (11.1484, -3.5681) knots 0 0 0 0 0.068595 0.133246 0.194313 0.251279 0.304513 0.354235 0.400481 0.443411 0.484015 0.523252 0.561042 0.5979 0.633518 0.668314 0.702496 0.736685 0.770293 0.803437 0.835913 0.86846 0.900847 0.933467 0.966258 1 1 1 1
  spline S26 degree 3 poles (11.1484, -3.5681) (11.1482, -3.5785) (11.1479, -3.599) (11.1444, -3.6294) (11.1387, -3.6591) (11.1305, -3.688) (11.1204, -3.7163) (11.1078, -3.7437) (11.093, -3.7705) (11.0757, -3.7963) (11.0564, -3.8213) (11.0346, -3.8448) (11.0105, -3.867) (10.9843, -3.8881) (10.9556, -3.9074) (10.9248, -3.9258) (10.8915, -3.9423) (10.8562, -3.9582) (10.8178, -3.9719) (10.7767, -3.9842) (10.7323, -3.9942) (10.6848, -4.0025) (10.6341, -4.009) (10.5804, -4.0136) (10.5235, -4.0161) (10.4845, -4.0166) (10.4646, -4.0168) knots 0 0 0 0 0.033788 0.067194 0.099862 0.132567 0.165151 0.197913 0.231319 0.265083 0.299255 0.334399 0.369943 0.406284 0.444064 0.482998 0.523354 0.565537 0.609613 0.656391 0.705885 0.758325 0.813832 0.872795 0.934722 1 1 1 1
  line L64 (10.4651, 2.1332) -> (11.1151, 1.9998)
  line L65 (11.1151, 1.9998) -> (11.1151, 1.4665)
  line L66 (11.1151, 1.4665) -> (10.9818, 1.4665)
  line L67 (10.9818, 1.4665) -> (10.9818, 1.9087)
  line L68 (10.9818, 1.9087) -> (10.6398, 1.9787)
  spline S27 degree 3 poles (10.6398, 1.9787) (10.6436, 1.965) (10.651, 1.9383) (10.6592, 1.899) (10.6641, 1.8616) (10.6648, 1.8374) (10.6651, 1.8256) knots 0 0 0 0 0.275068 0.532901 0.773973 1 1 1 1
  spline S28 degree 3 poles (10.6651, 1.8256) (10.6648, 1.8111) (10.6642, 1.7826) (10.6582, 1.7408) (10.6489, 1.7009) (10.6358, 1.663) (10.6192, 1.6271) (10.5983, 1.5933) (10.574, 1.5613) (10.546, 1.5316) (10.5152, 1.5047) (10.4821, 1.481) (10.447, 1.4609) (10.4095, 1.4447) (10.3702, 1.4318) (10.3285, 1.4232) (10.2849, 1.4175) (10.255, 1.4168) (10.2398, 1.4165) knots 0 0 0 0 0.065808 0.129394 0.190894 0.251281 0.310815 0.370371 0.430768 0.492881 0.555104 0.616067 0.677256 0.73826 0.800762 0.864778 0.931045 1 1 1 1
  spline S29 degree 3 poles (10.2398, 1.4165) (10.2292, 1.4168) (10.2082, 1.4172) (10.1769, 1.4197) (10.1464, 1.4245) (10.1164, 1.431) (10.0872, 1.4394) (10.0586, 1.4495) (10.0308, 1.4619) (10.0036, 1.4755) (9.9775, 1.4908) (9.9531, 1.5078) (9.9301, 1.5258) (9.9086, 1.5451) (9.8888, 1.566) (9.8706, 1.5882) (9.8537, 1.6115) (9.8388, 1.6362) (9.8251, 1.6619) (9.8138, 1.6889) (9.8038, 1.7165) (9.7957, 1.7453) (9.7894, 1.775) (9.7852, 1.8058) (9.7821, 1.8375) (9.7819, 1.859) (9.7818, 1.8699) knots 0 0 0 0 0.044014 0.087434 0.130118 0.172554 0.214555 0.256298 0.298438 0.340849 0.382715 0.423924 0.464246 0.504074 0.543862 0.583567 0.623094 0.663229 0.703551 0.743938 0.784541 0.82575 0.867757 0.910745 0.954914 1 1 1 1
  spline S30 degree 3 poles (9.7818, 1.8699) (9.782, 1.8828) (9.7825, 1.9083) (9.7878, 1.9457) (9.7954, 1.9816) (9.8067, 2.0158) (9.821, 2.0486) (9.839, 2.0796) (9.8594, 2.1096) (9.8835, 2.1372) (9.9099, 2.1629) (9.9385, 2.1859) (9.9688, 2.2064) (10.0011, 2.224) (10.0352, 2.2391) (10.0713, 2.2509) (10.1091, 2.2604) (10.1352, 2.2645) (10.1484, 2.2665) knots 0 0 0 0 0.065421 0.128708 0.190236 0.250724 0.310637 0.370766 0.431615 0.493523 0.555883 0.617342 0.678668 0.740711 0.802985 0.866803 0.932347 1 1 1 1
  line L69 (10.1484, 2.2665) -> (10.1484, 2.1498)
  spline S31 degree 3 poles (10.1484, 2.1498) (10.136, 2.147) (10.1122, 2.1415) (10.0787, 2.1293) (10.0489, 2.1145) (10.0223, 2.0969) (9.9991, 2.0759) (9.9785, 2.052) (9.9598, 2.0251) (9.9443, 1.9952) (9.9311, 1.9637) (9.9222, 1.9307) (9.916, 1.8972) (9.9154, 1.8745) (9.9151, 1.8631) knots 0 0 0 0 0.094687 0.181994 0.264377 0.34218 0.418618 0.496509 0.577369 0.661511 0.746733 0.831258 0.915206 1 1 1 1
  spline S32 degree 3 poles (9.9151, 1.8631) (9.9154, 1.852) (9.916, 1.8301) (9.9206, 1.7978) (9.9277, 1.7667) (9.9384, 1.737) (9.9513, 1.7082) (9.9679, 1.681) (9.9871, 1.6547) (10.0089, 1.63) (10.0331, 1.6074) (10.0589, 1.5874) (10.0864, 1.5708) (10.1152, 1.5568) (10.1455, 1.5461) (10.1773, 1.5386) (10.2105, 1.5341) (10.2332, 1.5335) (10.2448, 1.5332) knots 0 0 0 0 0.064207 0.126425 0.18768 0.248216 0.308305 0.369661 0.431699 0.495947 0.559758 0.622295 0.683911 0.745092 0.80674 0.869087 0.93329 1 1 1 1
  spline S33 degree 3 poles (10.2448, 1.5332) (10.2552, 1.5334) (10.2756, 1.5339) (10.3055, 1.5378) (10.3337, 1.5446) (10.3605, 1.5541) (10.3859, 1.566) (10.4098, 1.5807) (10.432, 1.5983) (10.4524, 1.6184) (10.4713, 1.6404) (10.4874, 1.6647) (10.501, 1.6908) (10.5127, 1.7184) (10.521, 1.7481) (10.5274, 1.7793) (10.531, 1.8124) (10.5315, 1.8351) (10.5318, 1.8467) knots 0 0 0 0 0.065351 0.127916 0.18836 0.247216 0.30563 0.36377 0.422661 0.482687 0.5433 0.604118 0.664965 0.727413 0.791468 0.858055 0.927037 1 1 1 1
  spline S34 degree 3 poles (10.5318, 1.8467) (10.5315, 1.8568) (10.5311, 1.8776) (10.5278, 1.9095) (10.5225, 1.943) (10.5153, 1.9781) (10.5057, 2.0147) (10.4943, 2.0529) (10.4807, 2.0926) (10.4704, 2.1194) (10.4651, 2.1332) knots 0 0 0 0 0.102203 0.211023 0.3251 0.446502 0.573788 0.708901 0.850358 1 1 1 1
  point P0 (0, 0)
  point P1 (7.5651, -9.5168)
extrude "Выдавливание5" cut sketch "Эскиз5" against normal through all contours A15 | A16
properties part number "joint1_gear_holder"
